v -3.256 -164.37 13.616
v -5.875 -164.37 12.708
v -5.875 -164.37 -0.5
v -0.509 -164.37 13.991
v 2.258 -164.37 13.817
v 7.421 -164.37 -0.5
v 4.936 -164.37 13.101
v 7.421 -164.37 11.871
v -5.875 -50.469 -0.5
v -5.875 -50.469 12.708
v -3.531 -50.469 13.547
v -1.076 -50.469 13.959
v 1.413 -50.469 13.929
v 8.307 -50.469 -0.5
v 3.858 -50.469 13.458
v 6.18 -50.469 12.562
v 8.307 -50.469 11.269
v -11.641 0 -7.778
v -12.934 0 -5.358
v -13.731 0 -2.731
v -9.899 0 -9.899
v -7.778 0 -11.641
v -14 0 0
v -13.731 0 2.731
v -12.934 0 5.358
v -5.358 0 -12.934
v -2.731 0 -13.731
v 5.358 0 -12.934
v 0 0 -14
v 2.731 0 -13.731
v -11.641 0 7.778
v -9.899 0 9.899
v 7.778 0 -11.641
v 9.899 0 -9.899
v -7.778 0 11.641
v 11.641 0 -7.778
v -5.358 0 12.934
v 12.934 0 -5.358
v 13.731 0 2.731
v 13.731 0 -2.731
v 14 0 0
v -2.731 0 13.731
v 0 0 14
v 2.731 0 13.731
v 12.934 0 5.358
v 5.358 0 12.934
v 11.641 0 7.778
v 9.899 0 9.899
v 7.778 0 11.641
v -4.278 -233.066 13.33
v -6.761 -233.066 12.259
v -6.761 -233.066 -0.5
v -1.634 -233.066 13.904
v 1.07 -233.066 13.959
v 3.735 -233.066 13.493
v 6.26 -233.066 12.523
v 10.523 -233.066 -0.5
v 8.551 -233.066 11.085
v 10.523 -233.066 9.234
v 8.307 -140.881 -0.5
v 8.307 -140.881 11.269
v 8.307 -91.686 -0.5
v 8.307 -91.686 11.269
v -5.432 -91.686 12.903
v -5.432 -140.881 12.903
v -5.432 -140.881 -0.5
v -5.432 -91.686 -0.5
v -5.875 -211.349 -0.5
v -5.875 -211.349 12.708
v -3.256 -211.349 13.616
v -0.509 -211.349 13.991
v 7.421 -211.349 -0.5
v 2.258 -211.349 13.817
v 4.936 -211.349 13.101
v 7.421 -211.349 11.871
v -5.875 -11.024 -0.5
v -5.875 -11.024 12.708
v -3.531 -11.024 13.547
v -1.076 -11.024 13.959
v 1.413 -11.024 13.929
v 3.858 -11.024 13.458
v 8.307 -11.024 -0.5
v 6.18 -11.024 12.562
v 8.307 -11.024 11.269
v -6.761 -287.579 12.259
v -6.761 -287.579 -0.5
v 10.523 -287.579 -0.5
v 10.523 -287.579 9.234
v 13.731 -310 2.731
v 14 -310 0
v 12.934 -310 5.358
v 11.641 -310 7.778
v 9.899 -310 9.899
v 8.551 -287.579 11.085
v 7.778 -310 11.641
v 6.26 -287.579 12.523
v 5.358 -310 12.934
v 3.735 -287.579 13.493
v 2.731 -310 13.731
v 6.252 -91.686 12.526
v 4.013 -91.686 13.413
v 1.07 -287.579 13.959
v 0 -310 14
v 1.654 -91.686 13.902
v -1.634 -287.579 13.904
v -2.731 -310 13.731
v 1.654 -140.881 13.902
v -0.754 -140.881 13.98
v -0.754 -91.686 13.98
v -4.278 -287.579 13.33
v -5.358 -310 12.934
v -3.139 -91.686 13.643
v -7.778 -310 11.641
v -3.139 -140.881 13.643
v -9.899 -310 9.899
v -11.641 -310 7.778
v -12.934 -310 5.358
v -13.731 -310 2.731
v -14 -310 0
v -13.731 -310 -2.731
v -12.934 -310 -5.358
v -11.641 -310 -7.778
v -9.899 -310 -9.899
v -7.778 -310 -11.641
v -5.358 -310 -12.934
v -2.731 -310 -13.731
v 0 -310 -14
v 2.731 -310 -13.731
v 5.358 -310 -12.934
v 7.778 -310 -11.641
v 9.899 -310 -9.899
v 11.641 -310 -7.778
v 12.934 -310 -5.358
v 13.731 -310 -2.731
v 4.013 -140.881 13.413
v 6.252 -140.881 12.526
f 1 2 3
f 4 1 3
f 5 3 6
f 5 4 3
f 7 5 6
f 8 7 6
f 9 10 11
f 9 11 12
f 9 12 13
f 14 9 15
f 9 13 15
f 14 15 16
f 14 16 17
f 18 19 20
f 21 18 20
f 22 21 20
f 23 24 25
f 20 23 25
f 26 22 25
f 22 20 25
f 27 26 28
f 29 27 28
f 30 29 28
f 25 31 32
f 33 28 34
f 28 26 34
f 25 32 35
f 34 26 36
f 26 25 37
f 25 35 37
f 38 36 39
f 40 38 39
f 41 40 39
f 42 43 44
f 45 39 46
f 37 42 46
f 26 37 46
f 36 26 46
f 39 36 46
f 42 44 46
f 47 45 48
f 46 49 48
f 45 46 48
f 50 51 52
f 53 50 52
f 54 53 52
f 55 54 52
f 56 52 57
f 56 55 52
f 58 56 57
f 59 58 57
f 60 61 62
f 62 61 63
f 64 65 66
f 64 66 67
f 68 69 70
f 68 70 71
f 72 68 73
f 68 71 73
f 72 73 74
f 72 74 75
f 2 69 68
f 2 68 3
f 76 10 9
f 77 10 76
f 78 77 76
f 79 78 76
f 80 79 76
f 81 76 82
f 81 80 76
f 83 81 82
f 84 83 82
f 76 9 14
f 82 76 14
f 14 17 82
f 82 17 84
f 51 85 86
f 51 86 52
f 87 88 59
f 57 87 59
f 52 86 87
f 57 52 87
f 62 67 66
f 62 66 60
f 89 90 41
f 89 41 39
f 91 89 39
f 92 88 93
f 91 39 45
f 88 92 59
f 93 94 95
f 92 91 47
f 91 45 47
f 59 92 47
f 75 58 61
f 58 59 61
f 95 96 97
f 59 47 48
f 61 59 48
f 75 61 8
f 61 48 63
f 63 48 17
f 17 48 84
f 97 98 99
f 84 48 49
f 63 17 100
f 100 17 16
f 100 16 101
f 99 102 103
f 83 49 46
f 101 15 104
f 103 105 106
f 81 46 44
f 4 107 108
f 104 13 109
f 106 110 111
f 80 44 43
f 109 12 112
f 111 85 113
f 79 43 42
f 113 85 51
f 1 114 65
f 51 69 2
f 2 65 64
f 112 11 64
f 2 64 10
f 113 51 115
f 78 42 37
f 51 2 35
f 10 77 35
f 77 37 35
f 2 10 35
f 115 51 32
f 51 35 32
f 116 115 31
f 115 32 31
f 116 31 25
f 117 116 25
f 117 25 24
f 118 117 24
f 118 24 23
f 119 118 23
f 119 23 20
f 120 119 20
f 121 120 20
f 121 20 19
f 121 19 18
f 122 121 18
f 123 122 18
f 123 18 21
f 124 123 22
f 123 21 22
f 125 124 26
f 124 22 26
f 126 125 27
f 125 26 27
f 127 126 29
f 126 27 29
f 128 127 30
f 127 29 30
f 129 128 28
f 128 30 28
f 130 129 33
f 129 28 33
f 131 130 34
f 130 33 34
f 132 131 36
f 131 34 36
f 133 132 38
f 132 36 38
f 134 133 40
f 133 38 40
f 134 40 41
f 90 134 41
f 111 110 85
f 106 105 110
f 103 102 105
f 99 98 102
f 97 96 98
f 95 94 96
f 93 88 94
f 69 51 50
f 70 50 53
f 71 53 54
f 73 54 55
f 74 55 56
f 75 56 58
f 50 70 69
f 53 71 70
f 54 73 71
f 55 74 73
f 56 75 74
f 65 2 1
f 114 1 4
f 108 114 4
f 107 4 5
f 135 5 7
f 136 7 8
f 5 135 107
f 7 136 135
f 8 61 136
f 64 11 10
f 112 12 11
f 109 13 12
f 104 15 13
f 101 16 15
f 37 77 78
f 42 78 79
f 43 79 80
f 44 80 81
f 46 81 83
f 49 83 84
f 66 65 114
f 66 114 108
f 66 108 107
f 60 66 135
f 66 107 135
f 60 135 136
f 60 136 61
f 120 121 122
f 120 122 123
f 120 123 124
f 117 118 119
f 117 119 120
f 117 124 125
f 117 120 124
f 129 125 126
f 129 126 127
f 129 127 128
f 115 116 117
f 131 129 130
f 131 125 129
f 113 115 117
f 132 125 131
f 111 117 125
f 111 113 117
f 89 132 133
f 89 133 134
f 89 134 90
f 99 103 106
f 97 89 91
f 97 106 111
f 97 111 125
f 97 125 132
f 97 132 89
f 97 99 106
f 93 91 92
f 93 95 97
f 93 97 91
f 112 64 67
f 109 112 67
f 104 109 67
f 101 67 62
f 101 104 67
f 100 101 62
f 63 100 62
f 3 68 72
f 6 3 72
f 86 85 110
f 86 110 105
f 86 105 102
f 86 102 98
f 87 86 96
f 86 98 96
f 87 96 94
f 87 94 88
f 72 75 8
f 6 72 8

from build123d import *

# Parameters (mm, degrees)
F0_R     = 14
F1_DEPTH = 310
F3_W     = 14.182319
F3_H     = 39.444565
F3_W_2   = 13.73912
F3_H_2   = 49.19491
F3_W_3   = 13.295921
F3_H_3   = 46.978921
F3_W_4   = 17.2847
F3_H_4   = 54.513276
F4_DEPTH = 15


with BuildPart() as f1:
    # F0 (on Front) → F1 (new body)
    with BuildSketch(Plane.XZ):
        Circle(F0_R)
    extrude(amount=F1_DEPTH)

    # F3 (on offset) → F4 (cut)
    with BuildSketch(Plane.XY.offset(14.5)):
        with Locations((1.216165, -30.746452)):
            Rectangle(F3_W, F3_H)
        with Locations((1.437765, -116.283547)):
            Rectangle(F3_W_2, F3_H_2)
        with Locations((0.772966, -187.859922)):
            Rectangle(F3_W_3, F3_H_3)
        with Locations((1.880962, -260.32269)):
            Rectangle(F3_W_4, F3_H_4)
    extrude(amount=-F4_DEPTH, mode=Mode.SUBTRACT)


solid = f1.part
